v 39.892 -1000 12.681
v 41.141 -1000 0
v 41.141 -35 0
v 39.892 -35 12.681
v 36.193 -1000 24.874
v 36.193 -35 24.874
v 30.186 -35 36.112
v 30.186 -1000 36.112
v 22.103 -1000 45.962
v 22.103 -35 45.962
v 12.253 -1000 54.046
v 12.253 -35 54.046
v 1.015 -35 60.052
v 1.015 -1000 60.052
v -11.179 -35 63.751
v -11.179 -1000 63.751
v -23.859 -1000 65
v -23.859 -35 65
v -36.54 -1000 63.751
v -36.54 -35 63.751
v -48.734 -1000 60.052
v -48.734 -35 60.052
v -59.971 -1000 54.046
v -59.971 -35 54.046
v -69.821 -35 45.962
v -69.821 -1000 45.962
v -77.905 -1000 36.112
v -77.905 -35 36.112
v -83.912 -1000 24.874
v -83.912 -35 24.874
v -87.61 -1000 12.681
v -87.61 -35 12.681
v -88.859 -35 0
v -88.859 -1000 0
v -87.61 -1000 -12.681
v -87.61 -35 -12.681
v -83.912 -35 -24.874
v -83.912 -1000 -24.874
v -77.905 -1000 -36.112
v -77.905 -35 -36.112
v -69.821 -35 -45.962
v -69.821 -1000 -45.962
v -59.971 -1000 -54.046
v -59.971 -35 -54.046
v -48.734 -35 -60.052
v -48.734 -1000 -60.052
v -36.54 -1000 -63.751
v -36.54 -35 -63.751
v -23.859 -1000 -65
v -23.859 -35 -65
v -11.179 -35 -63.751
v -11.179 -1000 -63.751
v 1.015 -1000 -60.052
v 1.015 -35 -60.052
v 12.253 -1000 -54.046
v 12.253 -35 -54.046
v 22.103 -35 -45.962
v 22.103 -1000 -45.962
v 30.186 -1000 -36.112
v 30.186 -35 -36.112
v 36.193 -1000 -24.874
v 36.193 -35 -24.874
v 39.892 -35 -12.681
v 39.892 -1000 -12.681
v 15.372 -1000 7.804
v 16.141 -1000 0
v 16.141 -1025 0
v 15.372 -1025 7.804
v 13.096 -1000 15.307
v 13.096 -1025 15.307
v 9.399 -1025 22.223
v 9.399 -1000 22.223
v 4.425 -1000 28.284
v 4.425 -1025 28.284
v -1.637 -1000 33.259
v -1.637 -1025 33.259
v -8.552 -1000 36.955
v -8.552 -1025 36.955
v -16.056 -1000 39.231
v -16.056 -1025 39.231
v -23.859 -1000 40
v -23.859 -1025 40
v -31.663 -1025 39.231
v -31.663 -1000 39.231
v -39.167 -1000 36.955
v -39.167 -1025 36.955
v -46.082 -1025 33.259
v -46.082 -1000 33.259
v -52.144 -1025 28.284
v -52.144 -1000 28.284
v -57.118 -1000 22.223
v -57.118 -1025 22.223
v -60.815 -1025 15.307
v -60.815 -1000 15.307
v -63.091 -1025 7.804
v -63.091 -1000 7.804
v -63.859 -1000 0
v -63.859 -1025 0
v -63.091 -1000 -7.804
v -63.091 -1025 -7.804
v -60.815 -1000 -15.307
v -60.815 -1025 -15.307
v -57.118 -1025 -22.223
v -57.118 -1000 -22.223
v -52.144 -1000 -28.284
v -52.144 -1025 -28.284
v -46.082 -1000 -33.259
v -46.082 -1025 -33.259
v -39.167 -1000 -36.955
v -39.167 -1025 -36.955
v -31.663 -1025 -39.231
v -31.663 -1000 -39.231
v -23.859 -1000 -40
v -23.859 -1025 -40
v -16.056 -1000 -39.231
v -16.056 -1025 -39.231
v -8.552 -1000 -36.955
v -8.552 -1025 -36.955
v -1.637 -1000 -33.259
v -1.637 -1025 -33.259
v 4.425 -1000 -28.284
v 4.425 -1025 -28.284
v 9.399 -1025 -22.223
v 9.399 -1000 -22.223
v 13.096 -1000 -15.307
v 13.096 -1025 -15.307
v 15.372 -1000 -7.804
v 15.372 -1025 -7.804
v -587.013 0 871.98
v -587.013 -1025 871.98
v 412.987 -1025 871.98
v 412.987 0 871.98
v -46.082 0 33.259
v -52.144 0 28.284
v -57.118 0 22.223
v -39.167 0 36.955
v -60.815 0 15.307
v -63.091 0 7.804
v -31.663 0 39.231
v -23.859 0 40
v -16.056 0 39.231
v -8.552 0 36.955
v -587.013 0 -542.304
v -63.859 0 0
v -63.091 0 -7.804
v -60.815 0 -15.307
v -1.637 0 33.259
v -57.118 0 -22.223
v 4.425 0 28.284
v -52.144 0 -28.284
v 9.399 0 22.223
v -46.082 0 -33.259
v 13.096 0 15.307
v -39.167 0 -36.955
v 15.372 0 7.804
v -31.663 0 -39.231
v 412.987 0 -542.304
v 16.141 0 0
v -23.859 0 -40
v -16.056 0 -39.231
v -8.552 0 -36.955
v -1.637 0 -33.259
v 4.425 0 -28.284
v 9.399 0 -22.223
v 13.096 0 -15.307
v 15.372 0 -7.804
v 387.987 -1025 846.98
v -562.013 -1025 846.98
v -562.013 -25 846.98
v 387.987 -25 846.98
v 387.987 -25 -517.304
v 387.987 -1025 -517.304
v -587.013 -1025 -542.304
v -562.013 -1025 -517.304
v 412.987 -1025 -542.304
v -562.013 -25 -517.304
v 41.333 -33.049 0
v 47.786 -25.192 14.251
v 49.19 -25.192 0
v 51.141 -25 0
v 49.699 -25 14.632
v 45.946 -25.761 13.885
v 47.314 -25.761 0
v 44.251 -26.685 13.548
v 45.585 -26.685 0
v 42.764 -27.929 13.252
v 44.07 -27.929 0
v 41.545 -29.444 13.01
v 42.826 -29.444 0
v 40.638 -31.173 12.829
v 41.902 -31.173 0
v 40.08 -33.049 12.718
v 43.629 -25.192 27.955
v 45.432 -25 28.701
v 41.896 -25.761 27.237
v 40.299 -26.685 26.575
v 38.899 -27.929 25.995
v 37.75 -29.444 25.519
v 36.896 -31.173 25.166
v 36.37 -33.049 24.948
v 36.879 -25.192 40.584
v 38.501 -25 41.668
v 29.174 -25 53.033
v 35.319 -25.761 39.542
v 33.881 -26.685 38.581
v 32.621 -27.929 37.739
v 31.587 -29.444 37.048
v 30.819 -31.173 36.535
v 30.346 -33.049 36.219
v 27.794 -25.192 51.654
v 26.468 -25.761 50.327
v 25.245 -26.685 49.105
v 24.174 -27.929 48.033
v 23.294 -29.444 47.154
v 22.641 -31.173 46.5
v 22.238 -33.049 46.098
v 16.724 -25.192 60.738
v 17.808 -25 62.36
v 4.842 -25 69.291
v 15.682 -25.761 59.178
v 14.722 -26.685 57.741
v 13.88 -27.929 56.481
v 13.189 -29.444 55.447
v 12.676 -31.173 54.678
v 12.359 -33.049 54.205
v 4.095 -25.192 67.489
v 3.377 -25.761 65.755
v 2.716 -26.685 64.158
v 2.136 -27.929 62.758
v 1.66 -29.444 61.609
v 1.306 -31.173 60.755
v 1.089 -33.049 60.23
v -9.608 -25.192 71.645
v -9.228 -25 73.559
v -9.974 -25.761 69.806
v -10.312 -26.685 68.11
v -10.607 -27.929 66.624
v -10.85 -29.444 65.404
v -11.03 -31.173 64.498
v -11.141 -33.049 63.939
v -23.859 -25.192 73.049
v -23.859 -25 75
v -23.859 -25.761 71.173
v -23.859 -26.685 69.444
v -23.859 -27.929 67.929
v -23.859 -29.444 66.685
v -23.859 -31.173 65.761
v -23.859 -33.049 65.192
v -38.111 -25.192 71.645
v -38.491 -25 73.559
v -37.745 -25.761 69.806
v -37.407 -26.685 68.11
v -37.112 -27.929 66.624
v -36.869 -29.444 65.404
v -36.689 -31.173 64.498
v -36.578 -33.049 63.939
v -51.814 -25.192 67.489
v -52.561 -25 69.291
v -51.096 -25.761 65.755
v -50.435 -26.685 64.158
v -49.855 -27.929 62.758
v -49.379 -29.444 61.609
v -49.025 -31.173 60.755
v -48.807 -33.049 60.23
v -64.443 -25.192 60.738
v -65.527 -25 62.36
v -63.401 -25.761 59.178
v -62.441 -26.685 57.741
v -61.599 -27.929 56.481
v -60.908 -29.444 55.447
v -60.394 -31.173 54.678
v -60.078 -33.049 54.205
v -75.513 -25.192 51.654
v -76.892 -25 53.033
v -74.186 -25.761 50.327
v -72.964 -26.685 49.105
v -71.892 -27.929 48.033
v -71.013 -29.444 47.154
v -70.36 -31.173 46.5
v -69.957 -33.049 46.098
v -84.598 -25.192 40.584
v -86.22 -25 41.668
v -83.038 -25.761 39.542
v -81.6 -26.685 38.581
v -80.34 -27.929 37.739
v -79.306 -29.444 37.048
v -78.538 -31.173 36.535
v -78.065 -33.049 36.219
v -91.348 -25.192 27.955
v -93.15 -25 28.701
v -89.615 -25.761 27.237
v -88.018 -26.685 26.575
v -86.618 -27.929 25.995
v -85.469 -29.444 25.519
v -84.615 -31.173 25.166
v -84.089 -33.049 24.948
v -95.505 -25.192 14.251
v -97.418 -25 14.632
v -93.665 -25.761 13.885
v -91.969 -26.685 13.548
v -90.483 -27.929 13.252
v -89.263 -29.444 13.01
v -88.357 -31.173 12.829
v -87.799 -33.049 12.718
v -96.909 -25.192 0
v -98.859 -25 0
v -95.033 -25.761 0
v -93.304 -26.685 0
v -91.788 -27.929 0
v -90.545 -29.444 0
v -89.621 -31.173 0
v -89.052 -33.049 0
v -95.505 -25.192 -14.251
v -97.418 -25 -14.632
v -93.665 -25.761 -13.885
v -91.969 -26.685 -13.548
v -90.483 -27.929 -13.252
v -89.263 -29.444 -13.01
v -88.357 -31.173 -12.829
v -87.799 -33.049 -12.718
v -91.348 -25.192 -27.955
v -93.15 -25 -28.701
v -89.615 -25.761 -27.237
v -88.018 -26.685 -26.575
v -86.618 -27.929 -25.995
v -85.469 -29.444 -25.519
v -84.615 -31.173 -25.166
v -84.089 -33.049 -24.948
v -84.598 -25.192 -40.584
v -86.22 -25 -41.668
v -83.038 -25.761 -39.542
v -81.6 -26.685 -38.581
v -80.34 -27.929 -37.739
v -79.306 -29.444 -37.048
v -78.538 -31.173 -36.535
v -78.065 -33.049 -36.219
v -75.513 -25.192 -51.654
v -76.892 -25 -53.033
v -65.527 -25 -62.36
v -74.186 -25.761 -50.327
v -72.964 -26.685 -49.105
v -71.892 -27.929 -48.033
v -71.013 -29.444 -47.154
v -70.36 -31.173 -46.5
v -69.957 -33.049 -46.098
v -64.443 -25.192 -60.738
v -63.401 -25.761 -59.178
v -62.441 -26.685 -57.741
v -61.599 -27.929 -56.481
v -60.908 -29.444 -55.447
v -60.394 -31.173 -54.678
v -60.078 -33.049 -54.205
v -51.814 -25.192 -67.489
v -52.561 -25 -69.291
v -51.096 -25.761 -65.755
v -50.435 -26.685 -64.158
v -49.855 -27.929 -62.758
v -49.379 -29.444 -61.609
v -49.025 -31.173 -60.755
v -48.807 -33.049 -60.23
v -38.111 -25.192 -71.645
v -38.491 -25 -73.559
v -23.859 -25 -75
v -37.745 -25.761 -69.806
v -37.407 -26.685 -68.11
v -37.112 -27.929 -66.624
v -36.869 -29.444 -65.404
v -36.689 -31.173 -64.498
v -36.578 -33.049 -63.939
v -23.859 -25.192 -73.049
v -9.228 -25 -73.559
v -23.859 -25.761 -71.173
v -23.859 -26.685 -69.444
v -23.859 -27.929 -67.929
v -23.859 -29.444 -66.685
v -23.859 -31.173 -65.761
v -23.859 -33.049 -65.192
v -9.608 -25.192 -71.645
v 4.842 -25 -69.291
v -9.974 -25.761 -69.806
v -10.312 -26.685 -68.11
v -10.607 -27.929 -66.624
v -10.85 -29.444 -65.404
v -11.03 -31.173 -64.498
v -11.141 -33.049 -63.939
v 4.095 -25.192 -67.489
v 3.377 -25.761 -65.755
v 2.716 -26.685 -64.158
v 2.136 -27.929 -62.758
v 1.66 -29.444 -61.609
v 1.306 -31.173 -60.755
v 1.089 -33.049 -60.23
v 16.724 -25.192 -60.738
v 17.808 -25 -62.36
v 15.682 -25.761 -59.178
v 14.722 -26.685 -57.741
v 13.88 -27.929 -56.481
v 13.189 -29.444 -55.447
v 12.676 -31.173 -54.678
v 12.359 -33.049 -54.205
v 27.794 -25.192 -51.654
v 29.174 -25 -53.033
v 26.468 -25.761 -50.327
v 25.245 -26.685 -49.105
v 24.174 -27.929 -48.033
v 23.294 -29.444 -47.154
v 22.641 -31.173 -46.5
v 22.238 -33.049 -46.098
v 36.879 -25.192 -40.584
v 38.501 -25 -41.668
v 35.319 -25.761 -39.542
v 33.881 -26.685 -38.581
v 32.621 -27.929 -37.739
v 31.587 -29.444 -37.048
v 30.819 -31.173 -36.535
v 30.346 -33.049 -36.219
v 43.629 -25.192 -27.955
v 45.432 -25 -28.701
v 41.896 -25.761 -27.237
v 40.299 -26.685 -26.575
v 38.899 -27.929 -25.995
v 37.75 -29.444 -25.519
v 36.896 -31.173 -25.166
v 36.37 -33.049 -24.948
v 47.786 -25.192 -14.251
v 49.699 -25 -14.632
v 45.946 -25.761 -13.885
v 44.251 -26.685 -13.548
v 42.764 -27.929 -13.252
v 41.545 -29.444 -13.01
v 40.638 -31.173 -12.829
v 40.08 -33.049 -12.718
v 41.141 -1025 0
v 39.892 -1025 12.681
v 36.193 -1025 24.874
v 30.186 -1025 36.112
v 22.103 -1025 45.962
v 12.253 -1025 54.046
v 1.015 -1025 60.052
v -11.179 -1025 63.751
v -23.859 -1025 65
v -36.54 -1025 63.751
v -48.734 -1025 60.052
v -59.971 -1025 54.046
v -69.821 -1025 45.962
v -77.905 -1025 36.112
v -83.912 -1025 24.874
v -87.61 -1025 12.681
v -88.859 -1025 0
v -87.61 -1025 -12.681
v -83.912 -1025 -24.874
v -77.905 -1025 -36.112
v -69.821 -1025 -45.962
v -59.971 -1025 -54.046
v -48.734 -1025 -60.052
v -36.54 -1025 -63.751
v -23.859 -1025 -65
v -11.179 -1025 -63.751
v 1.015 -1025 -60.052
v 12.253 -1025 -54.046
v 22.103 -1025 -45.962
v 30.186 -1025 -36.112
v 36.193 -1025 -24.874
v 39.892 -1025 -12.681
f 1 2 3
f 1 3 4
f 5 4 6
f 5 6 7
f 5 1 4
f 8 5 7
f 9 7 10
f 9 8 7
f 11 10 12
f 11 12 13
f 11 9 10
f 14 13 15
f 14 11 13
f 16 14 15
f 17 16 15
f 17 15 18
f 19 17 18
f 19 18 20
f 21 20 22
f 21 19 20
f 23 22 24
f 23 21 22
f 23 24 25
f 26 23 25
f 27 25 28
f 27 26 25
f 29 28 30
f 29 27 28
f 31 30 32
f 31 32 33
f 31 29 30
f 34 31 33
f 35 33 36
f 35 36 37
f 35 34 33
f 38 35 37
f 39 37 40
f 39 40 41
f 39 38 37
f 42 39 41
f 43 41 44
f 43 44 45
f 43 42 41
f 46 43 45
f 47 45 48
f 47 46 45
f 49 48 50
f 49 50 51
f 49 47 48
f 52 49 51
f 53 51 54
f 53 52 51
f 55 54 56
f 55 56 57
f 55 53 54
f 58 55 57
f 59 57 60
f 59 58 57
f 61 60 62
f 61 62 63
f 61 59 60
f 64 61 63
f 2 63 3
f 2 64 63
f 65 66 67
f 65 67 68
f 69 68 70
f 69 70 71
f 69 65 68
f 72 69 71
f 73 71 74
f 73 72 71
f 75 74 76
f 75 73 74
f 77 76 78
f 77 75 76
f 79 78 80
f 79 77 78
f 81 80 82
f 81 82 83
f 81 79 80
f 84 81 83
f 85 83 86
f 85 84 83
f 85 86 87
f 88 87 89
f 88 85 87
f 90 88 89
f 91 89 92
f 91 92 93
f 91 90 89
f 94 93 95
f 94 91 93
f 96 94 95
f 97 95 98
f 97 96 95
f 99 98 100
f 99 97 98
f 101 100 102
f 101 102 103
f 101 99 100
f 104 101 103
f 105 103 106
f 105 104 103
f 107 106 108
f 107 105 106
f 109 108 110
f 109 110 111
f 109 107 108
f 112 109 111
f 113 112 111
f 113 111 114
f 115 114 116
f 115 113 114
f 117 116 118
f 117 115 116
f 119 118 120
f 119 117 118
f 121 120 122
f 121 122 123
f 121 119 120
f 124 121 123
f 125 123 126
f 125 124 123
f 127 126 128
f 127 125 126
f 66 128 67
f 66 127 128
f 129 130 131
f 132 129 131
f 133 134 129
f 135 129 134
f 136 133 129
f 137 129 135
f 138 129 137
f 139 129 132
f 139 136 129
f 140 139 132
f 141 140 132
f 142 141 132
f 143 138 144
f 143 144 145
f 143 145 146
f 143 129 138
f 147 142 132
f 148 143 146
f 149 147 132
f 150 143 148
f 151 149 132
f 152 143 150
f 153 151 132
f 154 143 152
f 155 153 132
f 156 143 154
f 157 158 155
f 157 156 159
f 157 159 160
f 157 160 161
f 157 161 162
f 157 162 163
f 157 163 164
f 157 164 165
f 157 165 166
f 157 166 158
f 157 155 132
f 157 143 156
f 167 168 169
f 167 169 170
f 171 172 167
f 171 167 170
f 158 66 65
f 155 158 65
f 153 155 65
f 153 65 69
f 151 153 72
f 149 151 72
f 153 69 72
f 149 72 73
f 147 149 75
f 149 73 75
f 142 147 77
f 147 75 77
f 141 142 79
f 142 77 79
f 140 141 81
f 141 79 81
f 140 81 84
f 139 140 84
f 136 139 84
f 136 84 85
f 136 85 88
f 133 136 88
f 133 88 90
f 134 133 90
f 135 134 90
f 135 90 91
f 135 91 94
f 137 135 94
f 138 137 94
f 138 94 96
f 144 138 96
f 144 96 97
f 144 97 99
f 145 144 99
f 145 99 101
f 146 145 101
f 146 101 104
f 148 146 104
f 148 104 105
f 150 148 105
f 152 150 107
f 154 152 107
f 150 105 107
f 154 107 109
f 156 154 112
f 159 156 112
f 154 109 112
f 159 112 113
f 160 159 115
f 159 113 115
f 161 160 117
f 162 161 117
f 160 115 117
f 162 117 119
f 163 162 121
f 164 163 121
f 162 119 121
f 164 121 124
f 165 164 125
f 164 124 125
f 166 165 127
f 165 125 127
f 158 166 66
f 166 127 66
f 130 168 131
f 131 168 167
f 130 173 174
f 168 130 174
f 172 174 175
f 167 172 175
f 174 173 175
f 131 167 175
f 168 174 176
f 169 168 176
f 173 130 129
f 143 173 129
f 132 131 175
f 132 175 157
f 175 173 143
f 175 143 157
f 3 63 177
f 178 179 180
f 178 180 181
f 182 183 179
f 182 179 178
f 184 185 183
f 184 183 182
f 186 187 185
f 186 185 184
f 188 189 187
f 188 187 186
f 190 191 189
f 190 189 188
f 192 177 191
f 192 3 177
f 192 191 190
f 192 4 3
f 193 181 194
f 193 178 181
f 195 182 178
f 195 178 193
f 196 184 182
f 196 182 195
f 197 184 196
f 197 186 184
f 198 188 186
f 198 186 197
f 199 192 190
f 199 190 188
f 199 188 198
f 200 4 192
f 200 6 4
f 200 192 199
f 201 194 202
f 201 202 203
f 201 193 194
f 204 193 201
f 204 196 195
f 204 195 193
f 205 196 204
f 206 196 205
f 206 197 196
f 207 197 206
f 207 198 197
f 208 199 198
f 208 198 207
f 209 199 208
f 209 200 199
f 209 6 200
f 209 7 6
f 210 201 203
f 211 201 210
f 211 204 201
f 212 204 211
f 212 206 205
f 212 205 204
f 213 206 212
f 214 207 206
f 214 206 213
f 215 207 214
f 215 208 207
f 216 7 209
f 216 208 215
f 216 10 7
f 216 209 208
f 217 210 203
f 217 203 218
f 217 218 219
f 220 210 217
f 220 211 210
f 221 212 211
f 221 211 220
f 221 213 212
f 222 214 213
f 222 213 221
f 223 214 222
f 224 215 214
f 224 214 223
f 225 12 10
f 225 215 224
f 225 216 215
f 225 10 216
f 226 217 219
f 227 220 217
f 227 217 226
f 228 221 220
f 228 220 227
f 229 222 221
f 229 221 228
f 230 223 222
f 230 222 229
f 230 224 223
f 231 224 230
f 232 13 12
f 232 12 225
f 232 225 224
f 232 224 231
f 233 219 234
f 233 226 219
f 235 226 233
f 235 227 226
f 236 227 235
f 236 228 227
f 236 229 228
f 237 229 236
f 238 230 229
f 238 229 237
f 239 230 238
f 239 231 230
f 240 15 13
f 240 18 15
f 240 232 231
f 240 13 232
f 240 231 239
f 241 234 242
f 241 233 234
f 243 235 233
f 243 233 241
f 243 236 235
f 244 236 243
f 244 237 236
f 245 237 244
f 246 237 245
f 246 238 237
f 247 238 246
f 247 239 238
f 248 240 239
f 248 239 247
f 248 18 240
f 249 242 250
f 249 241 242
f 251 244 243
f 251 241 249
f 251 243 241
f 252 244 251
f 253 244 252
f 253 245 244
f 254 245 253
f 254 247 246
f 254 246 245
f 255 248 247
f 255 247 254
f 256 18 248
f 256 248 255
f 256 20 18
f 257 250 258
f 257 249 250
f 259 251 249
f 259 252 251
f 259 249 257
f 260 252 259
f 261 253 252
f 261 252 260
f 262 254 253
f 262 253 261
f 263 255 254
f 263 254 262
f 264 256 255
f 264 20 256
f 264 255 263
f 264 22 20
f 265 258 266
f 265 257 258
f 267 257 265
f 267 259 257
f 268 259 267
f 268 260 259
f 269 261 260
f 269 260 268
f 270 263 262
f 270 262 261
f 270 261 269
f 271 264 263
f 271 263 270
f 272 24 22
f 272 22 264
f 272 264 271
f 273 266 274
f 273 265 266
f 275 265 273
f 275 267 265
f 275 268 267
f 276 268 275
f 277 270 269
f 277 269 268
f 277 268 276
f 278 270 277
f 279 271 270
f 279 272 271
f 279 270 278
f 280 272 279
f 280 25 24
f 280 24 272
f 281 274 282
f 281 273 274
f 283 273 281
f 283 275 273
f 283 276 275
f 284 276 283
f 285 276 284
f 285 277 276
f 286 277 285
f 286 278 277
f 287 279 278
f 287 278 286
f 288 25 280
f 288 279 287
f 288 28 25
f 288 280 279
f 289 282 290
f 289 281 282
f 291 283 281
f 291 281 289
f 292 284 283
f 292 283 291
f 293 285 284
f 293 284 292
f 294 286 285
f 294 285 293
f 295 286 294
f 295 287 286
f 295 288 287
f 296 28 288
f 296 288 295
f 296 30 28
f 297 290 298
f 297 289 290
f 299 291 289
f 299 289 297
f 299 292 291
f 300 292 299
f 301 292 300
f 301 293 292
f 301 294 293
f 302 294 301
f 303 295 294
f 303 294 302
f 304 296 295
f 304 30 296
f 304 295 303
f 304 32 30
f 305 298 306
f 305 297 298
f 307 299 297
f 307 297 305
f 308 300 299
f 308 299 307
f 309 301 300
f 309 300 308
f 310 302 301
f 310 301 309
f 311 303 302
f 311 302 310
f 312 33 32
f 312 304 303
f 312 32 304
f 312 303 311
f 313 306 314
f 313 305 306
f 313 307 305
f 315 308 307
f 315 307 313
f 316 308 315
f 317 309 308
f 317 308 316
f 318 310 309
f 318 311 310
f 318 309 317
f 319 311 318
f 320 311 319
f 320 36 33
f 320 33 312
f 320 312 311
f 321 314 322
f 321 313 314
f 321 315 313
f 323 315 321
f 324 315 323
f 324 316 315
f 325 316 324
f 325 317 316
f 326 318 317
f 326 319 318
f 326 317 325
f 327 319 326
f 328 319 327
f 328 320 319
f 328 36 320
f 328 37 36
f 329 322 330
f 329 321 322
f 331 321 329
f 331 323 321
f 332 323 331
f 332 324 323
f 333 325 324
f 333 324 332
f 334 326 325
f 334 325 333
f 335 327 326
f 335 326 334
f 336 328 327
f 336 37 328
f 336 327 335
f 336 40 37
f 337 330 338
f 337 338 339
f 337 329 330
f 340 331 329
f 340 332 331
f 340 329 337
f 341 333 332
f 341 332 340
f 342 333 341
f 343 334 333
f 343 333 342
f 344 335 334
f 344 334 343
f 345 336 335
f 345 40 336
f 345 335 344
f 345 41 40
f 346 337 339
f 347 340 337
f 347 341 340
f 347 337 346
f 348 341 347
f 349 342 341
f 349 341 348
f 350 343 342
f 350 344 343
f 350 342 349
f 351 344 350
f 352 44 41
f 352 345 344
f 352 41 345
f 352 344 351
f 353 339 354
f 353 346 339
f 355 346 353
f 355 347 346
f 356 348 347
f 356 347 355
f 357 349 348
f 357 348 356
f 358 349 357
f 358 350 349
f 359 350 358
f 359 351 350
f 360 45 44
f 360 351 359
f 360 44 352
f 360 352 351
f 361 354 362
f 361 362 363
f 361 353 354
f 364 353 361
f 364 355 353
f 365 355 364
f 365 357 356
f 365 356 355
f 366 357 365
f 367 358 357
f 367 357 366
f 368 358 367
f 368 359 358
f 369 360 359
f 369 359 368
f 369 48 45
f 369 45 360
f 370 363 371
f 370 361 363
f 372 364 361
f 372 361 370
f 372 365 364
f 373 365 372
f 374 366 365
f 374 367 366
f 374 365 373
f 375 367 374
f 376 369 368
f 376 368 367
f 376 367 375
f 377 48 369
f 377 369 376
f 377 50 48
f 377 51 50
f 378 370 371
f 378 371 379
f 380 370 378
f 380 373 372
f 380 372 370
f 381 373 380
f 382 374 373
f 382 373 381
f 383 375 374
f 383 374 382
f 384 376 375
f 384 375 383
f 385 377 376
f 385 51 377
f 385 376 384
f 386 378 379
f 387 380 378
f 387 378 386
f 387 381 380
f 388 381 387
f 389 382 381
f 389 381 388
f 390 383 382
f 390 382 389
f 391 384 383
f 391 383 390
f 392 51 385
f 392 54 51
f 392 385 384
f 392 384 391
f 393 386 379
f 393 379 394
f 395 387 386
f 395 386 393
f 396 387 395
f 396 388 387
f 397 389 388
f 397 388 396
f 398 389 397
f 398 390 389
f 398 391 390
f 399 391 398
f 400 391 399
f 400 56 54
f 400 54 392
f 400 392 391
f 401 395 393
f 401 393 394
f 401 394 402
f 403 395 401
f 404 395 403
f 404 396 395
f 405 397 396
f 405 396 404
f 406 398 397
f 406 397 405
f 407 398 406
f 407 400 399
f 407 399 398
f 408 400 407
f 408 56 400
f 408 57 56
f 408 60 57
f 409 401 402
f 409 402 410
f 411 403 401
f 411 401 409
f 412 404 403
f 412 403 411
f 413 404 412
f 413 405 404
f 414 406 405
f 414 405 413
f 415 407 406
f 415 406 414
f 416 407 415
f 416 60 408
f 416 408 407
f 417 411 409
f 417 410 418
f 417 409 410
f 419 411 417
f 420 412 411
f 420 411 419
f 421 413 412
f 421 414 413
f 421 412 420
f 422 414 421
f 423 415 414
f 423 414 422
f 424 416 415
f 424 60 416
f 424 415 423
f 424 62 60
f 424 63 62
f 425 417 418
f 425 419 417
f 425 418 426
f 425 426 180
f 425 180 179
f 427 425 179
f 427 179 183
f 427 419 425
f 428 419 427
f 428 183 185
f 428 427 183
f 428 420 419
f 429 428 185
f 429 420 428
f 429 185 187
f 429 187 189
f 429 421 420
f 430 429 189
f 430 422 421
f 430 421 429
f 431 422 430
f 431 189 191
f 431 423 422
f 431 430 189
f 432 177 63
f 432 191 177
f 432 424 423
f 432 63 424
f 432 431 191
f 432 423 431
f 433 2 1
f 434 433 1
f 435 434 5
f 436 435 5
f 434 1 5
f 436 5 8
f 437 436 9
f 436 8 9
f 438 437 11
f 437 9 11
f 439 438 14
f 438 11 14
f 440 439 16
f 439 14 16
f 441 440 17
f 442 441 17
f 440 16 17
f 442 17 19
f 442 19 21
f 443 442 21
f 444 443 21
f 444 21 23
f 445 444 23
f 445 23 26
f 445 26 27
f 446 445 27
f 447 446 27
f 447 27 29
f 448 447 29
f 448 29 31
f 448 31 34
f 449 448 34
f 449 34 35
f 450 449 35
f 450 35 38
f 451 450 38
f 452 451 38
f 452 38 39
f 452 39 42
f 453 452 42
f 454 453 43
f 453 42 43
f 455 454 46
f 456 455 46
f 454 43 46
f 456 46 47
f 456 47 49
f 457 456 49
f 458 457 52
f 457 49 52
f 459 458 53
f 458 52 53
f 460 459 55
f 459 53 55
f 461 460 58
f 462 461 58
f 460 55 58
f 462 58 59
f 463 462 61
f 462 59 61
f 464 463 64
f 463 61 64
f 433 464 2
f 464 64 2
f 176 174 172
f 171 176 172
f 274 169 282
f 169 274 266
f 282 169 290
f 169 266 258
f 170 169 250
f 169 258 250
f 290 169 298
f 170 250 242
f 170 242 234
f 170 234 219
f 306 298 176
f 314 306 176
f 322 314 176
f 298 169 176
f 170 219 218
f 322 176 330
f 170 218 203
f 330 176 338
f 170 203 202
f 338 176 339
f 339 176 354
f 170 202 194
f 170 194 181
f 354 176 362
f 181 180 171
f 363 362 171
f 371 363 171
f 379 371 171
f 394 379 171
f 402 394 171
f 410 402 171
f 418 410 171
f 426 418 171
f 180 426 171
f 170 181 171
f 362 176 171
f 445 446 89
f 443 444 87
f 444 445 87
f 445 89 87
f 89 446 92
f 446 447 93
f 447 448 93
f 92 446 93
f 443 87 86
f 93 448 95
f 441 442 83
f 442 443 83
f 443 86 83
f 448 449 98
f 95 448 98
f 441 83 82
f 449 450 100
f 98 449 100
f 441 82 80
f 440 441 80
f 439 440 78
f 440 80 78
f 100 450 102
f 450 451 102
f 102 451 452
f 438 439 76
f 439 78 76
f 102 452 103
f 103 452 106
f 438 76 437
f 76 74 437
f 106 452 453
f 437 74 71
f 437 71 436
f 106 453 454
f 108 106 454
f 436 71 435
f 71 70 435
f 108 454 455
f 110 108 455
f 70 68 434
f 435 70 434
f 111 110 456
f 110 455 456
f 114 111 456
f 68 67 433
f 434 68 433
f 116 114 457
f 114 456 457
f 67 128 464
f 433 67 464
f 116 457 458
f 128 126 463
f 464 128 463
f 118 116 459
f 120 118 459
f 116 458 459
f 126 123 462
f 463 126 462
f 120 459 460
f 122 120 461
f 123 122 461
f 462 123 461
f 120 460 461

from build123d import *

# Parameters (mm, degrees)
F0_W     = 1000
F0_H     = 1079.8176152468
F1_DEPTH = 1000
F2_R     = 40
F3_DEPTH = 1463.3684158325
F4_DEPTH = 25
F5_DEPTH = 334.466189146
F6_T     = -25
F7_R     = 10


with BuildPart() as f1:
    # F0 (on Front) → F1 (new body)
    with BuildSketch(Plane.XZ):
        with Locations((-87.0127184317, -2.3948438466)):
            Rectangle(F0_W, F0_H)
    extrude(amount=F1_DEPTH)

    # F2 (on face) → F3 (cut)
    with BuildSketch(Plane.XZ.offset(1000)):
        with Locations((-23.8594158151, 0)):
            Circle(F2_R)
    extrude(amount=-F3_DEPTH, mode=Mode.SUBTRACT)

    # F4 (add): a face of the model
    f4_faces = [f1.faces().sort_by_distance(p)[0] for p in [
        (-87.3080717633, -1000, -2.4060439751),
    ]]
    extrude(f4_faces, amount=F4_DEPTH)

    # F5 (add): a face of the model
    f5_faces = [f1.faces().sort_by_distance(p)[0] for p in [
        (-87.0127184317, -512.5, 537.5139637768),
    ]]
    extrude(f5_faces, amount=F5_DEPTH)

    # F6
    f6_openings = [f1.faces().sort_by_distance(p)[0] for p in [
        (-87.237974, -1025, 165.426197),
    ]]
    offset(amount=F6_T, openings=f6_openings)

    # F7
    f7_edges = [f1.edges().sort_by_distance(p)[0] for p in [
        (-88.859416, -25, 0),
    ]]
    fillet(f7_edges, radius=F7_R)


solid = f1.part
